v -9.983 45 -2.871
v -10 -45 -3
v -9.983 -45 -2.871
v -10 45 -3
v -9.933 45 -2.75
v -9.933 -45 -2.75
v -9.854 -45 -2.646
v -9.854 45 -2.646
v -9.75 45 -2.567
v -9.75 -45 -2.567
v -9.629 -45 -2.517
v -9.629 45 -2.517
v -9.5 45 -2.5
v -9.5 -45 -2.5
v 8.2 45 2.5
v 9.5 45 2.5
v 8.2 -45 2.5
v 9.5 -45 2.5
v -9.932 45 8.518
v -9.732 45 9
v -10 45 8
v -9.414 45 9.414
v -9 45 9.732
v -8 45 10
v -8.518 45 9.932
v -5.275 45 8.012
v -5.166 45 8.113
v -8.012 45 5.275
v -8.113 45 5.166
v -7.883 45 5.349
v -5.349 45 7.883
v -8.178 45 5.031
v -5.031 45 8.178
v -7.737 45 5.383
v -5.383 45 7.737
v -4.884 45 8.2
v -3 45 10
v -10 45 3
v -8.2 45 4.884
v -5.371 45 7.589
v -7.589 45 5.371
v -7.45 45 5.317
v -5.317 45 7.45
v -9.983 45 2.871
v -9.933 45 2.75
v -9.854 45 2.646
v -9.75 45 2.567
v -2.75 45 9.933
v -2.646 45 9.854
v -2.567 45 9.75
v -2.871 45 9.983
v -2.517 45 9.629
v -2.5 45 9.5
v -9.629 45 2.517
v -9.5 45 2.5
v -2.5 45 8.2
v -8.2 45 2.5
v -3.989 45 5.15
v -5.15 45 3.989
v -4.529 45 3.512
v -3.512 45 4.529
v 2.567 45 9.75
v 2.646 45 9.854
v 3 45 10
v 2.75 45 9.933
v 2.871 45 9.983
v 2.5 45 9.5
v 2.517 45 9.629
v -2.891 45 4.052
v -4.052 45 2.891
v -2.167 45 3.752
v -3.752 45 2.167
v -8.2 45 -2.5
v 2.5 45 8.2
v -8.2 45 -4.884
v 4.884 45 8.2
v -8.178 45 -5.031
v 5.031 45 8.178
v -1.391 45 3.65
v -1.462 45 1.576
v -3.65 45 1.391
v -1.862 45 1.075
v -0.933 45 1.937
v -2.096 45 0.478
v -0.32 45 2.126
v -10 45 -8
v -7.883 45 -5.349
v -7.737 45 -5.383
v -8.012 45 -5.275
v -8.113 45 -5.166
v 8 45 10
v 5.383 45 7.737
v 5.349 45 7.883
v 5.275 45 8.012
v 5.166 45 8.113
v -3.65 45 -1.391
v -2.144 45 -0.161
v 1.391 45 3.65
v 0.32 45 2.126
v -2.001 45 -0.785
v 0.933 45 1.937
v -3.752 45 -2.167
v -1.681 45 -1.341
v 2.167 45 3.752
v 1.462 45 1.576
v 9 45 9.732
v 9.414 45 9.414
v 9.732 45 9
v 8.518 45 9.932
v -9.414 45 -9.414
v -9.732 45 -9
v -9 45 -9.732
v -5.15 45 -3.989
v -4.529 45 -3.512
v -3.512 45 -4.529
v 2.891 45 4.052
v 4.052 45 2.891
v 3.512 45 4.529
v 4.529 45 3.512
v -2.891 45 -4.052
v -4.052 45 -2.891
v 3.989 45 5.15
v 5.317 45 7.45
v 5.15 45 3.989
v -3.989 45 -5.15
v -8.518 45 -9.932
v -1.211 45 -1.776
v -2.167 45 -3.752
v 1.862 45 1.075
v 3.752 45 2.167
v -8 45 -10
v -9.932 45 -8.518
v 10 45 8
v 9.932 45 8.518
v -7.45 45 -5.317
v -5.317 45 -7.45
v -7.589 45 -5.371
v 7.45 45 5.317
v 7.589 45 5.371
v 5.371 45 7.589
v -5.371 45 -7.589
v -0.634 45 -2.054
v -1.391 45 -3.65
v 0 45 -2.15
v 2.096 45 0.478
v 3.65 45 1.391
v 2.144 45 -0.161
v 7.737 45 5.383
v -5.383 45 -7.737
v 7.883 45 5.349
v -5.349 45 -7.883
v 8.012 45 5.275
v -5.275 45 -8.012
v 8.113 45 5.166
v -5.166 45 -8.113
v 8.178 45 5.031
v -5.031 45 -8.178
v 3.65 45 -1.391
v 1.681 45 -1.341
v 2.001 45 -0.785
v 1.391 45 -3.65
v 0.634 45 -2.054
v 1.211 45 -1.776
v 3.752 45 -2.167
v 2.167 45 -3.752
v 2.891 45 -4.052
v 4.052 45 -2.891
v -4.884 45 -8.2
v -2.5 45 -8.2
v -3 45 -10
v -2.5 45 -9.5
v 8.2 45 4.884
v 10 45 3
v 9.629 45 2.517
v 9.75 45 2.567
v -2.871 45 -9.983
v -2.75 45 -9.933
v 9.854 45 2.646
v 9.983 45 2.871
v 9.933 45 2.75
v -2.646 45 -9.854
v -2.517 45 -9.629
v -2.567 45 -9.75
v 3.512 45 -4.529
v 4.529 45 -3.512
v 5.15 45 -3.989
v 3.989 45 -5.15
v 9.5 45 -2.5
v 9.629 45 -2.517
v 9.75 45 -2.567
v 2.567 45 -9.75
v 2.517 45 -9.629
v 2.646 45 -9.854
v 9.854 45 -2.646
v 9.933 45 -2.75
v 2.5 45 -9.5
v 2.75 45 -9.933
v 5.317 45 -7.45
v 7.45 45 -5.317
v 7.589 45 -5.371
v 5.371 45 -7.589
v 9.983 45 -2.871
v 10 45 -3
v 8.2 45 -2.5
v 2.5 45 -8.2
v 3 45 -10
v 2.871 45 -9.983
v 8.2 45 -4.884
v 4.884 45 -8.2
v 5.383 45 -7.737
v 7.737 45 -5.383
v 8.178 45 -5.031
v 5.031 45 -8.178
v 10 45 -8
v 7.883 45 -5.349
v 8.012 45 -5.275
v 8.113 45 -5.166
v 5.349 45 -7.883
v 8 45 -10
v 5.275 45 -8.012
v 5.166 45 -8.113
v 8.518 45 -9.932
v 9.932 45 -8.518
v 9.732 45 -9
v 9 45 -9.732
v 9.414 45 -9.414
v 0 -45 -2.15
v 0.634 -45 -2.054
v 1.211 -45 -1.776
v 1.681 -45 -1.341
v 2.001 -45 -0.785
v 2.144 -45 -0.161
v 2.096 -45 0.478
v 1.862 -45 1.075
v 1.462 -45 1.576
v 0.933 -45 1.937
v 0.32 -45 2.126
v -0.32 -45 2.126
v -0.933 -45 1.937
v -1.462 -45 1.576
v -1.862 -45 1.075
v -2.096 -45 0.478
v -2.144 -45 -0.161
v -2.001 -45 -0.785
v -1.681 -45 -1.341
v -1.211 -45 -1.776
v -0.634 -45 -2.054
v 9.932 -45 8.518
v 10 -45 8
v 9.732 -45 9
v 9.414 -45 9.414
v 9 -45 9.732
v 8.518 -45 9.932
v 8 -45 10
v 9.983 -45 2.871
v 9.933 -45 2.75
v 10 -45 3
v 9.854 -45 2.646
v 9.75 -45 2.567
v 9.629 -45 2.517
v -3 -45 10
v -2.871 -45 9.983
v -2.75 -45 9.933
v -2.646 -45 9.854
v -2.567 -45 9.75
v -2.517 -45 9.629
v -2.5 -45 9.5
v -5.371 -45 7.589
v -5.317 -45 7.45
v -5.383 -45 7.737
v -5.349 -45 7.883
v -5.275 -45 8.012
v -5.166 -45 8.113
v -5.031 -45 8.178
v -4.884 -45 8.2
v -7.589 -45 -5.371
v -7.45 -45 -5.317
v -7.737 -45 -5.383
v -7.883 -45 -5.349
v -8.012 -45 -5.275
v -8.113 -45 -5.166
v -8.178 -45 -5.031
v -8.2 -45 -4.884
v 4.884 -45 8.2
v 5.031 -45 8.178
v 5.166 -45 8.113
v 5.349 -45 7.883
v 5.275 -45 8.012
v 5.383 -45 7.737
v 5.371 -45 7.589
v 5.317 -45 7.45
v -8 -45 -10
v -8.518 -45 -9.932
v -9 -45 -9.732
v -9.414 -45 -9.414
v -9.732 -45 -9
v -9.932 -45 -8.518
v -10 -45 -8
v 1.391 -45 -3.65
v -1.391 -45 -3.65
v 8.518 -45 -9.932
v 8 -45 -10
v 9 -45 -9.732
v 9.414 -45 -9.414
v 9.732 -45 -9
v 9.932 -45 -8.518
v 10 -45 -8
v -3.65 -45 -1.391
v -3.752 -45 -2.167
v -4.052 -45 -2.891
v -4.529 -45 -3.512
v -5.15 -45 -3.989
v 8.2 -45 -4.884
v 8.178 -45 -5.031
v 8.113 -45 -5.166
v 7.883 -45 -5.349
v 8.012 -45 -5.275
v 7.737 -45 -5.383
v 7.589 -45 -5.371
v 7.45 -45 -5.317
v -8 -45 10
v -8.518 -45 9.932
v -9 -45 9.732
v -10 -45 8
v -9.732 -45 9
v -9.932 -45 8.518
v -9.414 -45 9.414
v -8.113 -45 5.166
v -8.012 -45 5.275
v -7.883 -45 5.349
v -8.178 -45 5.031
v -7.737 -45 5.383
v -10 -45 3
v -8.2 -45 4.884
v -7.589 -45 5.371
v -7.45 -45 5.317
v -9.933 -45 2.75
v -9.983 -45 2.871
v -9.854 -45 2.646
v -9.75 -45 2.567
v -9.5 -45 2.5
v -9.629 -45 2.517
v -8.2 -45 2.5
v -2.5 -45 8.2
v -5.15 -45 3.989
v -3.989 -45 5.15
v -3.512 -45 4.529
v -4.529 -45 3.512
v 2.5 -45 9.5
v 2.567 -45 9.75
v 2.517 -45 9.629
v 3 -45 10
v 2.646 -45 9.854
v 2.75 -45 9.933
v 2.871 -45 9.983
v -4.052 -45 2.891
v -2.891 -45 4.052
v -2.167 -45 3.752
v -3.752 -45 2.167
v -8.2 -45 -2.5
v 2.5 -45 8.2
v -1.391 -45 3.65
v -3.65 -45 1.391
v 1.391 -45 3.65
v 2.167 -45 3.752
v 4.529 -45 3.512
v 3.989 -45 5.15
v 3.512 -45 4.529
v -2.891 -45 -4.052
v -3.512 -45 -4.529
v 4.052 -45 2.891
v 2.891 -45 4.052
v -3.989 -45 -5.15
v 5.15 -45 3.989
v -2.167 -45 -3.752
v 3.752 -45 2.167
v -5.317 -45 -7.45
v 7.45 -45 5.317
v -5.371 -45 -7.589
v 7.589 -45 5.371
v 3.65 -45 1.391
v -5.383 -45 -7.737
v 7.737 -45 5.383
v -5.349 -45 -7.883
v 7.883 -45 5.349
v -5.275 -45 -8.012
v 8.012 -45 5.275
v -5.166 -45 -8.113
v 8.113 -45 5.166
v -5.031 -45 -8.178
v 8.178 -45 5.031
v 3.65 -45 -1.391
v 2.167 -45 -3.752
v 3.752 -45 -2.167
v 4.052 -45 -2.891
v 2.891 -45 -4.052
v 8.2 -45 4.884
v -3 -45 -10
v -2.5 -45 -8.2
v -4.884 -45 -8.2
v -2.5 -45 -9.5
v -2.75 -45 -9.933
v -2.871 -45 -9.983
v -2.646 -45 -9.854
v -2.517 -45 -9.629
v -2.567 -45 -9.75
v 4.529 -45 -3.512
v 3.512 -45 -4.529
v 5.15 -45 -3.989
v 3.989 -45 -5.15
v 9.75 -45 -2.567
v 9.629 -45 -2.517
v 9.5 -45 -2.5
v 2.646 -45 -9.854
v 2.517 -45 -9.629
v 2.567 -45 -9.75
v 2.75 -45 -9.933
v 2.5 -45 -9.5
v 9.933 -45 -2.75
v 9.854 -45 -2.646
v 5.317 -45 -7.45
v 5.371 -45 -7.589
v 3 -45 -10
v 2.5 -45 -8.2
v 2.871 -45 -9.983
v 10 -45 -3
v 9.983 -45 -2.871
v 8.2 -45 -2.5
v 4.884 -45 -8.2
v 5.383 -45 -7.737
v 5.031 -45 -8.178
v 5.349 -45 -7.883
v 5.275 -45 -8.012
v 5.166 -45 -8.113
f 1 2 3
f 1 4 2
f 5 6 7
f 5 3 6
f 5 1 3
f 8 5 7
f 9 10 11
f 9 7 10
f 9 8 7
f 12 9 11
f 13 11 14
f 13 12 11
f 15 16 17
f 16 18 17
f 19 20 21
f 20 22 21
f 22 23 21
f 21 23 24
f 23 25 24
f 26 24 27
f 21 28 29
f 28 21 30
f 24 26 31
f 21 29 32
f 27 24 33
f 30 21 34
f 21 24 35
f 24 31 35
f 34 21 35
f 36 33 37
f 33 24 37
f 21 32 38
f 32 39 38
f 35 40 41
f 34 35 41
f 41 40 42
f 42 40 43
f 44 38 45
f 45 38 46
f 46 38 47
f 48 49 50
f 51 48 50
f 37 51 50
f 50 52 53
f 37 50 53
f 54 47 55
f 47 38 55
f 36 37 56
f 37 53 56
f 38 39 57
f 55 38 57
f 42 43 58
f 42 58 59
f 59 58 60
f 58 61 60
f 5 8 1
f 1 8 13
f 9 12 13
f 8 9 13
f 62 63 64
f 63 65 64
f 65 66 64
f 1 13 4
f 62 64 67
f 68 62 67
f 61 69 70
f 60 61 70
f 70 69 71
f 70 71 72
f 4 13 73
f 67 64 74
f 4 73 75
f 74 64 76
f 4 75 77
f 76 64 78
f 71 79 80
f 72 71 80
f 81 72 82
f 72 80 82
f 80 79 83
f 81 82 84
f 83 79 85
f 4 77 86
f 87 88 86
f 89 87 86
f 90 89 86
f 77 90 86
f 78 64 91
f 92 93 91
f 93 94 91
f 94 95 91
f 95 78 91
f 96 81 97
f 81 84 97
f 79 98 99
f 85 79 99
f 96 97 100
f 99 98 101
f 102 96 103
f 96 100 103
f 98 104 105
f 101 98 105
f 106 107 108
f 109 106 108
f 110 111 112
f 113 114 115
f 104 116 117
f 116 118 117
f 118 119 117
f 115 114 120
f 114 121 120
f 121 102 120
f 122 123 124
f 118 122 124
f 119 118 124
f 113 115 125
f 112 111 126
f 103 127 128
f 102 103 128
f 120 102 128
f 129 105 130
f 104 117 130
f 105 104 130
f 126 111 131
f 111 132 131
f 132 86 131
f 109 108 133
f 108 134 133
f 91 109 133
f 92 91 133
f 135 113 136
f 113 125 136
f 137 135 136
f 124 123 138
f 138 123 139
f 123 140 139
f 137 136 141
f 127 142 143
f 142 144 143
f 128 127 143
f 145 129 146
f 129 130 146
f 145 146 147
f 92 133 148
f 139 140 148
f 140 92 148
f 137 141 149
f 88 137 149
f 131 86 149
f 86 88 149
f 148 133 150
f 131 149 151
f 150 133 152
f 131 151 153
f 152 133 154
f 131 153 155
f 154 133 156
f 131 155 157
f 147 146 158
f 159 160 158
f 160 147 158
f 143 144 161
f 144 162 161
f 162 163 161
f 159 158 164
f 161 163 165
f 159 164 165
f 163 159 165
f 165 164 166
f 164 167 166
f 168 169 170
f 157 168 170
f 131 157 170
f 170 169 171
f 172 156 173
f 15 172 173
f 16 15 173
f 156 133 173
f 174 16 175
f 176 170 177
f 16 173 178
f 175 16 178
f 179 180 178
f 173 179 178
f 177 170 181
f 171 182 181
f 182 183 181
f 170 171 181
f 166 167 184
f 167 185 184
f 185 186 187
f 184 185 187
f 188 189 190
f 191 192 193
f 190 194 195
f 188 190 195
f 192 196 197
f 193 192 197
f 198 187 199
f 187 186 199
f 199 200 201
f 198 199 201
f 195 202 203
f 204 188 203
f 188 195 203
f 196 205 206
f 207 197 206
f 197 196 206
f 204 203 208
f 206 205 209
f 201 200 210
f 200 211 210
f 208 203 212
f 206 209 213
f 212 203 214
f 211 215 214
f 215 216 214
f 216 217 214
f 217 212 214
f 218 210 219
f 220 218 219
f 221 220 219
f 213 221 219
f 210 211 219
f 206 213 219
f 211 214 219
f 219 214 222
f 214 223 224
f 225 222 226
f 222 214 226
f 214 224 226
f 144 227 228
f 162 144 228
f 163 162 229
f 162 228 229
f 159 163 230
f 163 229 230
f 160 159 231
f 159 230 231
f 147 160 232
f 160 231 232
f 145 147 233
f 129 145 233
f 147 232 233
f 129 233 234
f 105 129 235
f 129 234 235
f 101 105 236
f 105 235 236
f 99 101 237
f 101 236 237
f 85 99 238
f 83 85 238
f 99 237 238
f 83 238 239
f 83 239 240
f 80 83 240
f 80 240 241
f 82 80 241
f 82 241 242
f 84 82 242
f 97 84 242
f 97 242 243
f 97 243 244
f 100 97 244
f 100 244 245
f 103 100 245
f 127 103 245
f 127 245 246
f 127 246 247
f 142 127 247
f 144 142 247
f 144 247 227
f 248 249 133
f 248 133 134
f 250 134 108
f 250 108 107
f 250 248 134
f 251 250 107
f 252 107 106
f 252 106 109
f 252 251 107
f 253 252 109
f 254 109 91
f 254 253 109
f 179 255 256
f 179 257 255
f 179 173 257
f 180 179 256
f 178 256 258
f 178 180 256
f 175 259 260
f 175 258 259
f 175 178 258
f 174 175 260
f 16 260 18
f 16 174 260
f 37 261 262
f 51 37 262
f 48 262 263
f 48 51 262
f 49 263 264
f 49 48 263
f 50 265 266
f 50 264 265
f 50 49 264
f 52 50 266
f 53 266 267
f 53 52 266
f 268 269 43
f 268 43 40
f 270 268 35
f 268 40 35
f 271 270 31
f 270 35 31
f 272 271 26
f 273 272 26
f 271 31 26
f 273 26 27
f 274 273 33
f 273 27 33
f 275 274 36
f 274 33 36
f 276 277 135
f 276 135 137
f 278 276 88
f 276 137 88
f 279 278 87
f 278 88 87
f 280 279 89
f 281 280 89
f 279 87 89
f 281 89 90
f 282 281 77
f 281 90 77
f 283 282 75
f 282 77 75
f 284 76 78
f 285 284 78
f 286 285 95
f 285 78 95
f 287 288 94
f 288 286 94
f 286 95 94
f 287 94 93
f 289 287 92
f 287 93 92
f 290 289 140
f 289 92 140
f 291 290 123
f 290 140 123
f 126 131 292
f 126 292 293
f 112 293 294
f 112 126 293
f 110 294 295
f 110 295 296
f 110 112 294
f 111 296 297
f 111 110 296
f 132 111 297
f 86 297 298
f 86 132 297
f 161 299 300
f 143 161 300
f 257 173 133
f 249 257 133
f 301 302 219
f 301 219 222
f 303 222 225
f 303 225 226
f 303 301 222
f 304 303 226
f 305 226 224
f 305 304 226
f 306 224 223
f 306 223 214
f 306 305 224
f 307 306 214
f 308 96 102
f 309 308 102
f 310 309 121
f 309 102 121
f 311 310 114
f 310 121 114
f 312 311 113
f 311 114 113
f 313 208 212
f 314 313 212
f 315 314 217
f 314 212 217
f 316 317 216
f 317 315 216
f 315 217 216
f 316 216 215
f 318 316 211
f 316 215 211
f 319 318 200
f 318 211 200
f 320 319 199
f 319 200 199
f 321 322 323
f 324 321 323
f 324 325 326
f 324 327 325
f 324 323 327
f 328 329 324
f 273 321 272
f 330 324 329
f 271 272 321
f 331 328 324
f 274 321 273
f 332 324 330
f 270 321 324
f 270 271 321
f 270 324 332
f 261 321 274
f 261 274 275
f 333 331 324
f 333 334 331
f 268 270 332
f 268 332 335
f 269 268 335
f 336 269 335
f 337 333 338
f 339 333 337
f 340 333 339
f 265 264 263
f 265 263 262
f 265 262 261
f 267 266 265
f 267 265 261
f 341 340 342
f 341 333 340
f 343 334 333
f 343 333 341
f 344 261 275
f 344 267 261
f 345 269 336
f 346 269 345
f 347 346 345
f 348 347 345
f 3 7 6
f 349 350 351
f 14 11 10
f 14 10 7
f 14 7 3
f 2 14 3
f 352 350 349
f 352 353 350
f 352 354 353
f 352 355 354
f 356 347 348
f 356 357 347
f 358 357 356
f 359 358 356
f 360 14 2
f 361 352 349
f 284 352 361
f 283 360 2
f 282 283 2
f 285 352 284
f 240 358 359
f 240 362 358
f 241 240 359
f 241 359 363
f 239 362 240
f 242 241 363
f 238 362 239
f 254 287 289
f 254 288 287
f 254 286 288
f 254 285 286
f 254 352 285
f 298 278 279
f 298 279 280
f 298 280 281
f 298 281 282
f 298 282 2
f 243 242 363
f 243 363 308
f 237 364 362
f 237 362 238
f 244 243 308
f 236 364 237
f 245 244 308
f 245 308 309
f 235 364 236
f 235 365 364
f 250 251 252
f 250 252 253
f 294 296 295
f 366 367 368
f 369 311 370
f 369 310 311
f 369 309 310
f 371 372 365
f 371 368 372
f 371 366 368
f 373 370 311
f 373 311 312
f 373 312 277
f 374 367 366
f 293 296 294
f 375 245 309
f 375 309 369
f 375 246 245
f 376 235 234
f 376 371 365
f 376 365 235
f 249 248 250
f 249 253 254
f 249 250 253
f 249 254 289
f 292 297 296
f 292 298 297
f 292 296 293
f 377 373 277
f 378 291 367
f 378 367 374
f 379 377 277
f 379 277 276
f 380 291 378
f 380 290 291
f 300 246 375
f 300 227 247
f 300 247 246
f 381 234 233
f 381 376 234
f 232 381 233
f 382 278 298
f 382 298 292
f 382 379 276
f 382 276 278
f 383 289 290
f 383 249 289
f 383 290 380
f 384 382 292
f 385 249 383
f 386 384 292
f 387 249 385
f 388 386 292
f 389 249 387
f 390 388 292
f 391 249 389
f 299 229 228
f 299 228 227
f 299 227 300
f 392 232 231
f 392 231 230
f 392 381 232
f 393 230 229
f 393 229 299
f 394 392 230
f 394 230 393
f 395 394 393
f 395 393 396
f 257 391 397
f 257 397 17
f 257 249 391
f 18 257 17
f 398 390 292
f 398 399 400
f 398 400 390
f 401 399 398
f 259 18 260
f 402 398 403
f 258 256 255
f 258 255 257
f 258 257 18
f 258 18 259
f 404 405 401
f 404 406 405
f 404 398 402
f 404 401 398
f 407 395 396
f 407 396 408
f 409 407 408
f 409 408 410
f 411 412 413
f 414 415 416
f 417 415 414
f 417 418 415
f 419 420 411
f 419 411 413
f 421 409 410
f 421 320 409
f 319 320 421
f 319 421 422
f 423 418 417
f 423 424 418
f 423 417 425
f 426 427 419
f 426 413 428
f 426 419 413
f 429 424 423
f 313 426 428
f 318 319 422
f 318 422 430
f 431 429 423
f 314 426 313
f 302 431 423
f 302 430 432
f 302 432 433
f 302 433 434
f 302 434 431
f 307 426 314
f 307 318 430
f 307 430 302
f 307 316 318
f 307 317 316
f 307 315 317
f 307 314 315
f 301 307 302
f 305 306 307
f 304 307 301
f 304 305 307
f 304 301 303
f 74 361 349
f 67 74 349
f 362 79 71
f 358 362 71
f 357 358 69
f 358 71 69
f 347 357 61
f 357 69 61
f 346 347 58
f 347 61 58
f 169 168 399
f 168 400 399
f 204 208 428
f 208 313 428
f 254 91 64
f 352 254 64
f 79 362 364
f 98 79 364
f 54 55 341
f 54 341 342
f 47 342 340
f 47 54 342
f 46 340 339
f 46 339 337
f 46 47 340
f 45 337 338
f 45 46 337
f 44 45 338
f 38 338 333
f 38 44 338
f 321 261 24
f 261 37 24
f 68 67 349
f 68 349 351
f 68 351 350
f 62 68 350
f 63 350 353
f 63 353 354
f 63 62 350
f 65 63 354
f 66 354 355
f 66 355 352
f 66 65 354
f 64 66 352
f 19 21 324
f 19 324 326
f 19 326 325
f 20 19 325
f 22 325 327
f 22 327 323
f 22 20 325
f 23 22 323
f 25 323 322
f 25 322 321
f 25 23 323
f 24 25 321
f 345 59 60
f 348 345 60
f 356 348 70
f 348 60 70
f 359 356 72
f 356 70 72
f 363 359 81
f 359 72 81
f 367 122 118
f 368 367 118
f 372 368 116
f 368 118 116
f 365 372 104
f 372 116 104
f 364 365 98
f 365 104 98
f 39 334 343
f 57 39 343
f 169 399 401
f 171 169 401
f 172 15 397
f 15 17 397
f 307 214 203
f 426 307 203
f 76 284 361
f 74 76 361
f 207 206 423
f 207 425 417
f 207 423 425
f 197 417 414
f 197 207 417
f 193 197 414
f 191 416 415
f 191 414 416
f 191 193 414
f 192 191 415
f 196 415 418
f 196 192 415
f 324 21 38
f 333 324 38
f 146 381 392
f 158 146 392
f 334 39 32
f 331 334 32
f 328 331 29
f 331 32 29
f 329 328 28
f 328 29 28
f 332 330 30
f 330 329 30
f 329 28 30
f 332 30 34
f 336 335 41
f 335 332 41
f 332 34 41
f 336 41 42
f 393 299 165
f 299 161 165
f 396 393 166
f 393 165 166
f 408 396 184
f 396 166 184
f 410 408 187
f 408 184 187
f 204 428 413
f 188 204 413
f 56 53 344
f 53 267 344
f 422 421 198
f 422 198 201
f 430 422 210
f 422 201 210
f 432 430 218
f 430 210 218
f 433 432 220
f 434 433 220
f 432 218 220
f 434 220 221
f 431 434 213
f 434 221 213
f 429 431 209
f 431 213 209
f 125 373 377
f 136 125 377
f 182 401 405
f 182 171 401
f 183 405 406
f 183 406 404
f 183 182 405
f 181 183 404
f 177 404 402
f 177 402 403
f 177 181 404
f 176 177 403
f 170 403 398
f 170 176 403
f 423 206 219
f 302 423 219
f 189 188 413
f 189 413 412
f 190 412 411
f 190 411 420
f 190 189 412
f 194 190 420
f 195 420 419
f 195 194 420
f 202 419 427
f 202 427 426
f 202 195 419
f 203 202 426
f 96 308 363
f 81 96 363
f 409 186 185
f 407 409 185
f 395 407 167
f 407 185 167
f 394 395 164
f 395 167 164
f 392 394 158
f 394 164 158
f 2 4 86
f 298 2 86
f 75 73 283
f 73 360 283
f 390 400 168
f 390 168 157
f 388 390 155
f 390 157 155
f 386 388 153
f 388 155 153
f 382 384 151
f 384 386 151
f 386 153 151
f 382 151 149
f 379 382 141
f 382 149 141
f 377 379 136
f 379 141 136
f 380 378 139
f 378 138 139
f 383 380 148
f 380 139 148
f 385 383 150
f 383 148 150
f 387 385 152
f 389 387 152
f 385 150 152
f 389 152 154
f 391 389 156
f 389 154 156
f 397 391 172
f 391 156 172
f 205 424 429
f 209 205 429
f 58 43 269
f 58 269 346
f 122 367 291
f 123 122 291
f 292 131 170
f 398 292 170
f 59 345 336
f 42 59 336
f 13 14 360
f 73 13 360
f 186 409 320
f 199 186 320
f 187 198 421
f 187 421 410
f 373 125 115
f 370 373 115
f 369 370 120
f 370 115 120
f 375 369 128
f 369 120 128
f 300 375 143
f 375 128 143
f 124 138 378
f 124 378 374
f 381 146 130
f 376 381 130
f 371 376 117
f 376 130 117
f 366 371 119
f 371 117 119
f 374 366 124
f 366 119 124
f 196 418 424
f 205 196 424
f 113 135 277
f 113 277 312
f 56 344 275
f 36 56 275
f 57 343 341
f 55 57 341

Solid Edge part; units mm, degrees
sketch "Sketch1" plane through (0, 0, 0) normal (0, -1, 0) x (1, 0, 0)
  line L0 (-10, -10) -> (10, -10)
  line L1 (10, -10) -> (10, 10)
  line L2 (10, 10) -> (-10, 10)
  line L3 (-10, 10) -> (-10, -10)
  dimension "D1" = 20
  dimension "D2" = 20
extrude "Protrusion1" add sketch "Sketch1" along normal mid plane 90
sketch "Sketch2" plane through (0, -45, 0) normal (0, -1, 0) x (1, 0, 0)
  line L0 (-2.5, 10) -> (-2.5, 8.2)
  line L1 (-2.5, 8.2) -> (-5.75, 8.2)
  line L2 (-5.75, 8.2) -> (-3.1231, 3.65)
  line L3 (-3.1231, 3.65) -> (3.1231, 3.65)
  line L4 (3.1231, 3.65) -> (5.75, 8.2)
  line L5 (5.75, 8.2) -> (2.5, 8.2)
  line L6 (2.5, 8.2) -> (2.5, 10)
  line L7 (2.5, 10) -> (-2.5, 10)
  dimension "D1" = 11.5
  dimension "D2" = 1.8
  dimension "D3" = 5
  dimension "D4" = 6.35
extrude "Cutout1" cut sketch "Sketch2" against normal through all
fillet "Verrundung_1" radius 2 4 edges at (10, 0, 10) (-10, 0, 10) (10, 0, -10) (-10, 0, -10)
fillet "Verrundung_2" radius 3 2 edges at (-3.1231, 0, 3.65) (3.1231, 0, 3.65)
fillet "Verrundung_3" radius 0.5 4 edges at (-5.75, 0, 8.2) (5.75, 0, 8.2) (-2.5, 0, 10) (2.5, 0, 10)
hole "Bohrung_1" at (0, -45, 0) direction (0, 1, 0) diameter 4.3 end up to next
pattern_circular "Pattern1" count 4 over 360 about axis through (0, -45, 0) along (0, -1, 0) of "Cutout1"
fillet "Round1" radius 3 2 edges at (-3.65, 0, -3.1231) (-3.65, 0, 3.1231)
fillet "Round2" radius 0.5 4 edges at (-8.2, 0, -5.75) (-8.2, 0, 5.75) (-10, 0, -2.5) (-10, 0, 2.5)
fillet "Round3" radius 3 2 edges at (3.1231, 0, -3.65) (-3.1231, 0, -3.65)
fillet "Round4" radius 0.5 4 edges at (5.75, 0, -8.2) (-5.75, 0, -8.2) (2.5, 0, -10) (-2.5, 0, -10)
fillet "Round5" radius 3 2 edges at (3.65, 0, 3.1231) (3.65, 0, -3.1231)
fillet "Round6" radius 0.5 4 edges at (8.2, 0, 5.75) (8.2, 0, -5.75) (10, 0, 2.5) (10, 0, -2.5)
